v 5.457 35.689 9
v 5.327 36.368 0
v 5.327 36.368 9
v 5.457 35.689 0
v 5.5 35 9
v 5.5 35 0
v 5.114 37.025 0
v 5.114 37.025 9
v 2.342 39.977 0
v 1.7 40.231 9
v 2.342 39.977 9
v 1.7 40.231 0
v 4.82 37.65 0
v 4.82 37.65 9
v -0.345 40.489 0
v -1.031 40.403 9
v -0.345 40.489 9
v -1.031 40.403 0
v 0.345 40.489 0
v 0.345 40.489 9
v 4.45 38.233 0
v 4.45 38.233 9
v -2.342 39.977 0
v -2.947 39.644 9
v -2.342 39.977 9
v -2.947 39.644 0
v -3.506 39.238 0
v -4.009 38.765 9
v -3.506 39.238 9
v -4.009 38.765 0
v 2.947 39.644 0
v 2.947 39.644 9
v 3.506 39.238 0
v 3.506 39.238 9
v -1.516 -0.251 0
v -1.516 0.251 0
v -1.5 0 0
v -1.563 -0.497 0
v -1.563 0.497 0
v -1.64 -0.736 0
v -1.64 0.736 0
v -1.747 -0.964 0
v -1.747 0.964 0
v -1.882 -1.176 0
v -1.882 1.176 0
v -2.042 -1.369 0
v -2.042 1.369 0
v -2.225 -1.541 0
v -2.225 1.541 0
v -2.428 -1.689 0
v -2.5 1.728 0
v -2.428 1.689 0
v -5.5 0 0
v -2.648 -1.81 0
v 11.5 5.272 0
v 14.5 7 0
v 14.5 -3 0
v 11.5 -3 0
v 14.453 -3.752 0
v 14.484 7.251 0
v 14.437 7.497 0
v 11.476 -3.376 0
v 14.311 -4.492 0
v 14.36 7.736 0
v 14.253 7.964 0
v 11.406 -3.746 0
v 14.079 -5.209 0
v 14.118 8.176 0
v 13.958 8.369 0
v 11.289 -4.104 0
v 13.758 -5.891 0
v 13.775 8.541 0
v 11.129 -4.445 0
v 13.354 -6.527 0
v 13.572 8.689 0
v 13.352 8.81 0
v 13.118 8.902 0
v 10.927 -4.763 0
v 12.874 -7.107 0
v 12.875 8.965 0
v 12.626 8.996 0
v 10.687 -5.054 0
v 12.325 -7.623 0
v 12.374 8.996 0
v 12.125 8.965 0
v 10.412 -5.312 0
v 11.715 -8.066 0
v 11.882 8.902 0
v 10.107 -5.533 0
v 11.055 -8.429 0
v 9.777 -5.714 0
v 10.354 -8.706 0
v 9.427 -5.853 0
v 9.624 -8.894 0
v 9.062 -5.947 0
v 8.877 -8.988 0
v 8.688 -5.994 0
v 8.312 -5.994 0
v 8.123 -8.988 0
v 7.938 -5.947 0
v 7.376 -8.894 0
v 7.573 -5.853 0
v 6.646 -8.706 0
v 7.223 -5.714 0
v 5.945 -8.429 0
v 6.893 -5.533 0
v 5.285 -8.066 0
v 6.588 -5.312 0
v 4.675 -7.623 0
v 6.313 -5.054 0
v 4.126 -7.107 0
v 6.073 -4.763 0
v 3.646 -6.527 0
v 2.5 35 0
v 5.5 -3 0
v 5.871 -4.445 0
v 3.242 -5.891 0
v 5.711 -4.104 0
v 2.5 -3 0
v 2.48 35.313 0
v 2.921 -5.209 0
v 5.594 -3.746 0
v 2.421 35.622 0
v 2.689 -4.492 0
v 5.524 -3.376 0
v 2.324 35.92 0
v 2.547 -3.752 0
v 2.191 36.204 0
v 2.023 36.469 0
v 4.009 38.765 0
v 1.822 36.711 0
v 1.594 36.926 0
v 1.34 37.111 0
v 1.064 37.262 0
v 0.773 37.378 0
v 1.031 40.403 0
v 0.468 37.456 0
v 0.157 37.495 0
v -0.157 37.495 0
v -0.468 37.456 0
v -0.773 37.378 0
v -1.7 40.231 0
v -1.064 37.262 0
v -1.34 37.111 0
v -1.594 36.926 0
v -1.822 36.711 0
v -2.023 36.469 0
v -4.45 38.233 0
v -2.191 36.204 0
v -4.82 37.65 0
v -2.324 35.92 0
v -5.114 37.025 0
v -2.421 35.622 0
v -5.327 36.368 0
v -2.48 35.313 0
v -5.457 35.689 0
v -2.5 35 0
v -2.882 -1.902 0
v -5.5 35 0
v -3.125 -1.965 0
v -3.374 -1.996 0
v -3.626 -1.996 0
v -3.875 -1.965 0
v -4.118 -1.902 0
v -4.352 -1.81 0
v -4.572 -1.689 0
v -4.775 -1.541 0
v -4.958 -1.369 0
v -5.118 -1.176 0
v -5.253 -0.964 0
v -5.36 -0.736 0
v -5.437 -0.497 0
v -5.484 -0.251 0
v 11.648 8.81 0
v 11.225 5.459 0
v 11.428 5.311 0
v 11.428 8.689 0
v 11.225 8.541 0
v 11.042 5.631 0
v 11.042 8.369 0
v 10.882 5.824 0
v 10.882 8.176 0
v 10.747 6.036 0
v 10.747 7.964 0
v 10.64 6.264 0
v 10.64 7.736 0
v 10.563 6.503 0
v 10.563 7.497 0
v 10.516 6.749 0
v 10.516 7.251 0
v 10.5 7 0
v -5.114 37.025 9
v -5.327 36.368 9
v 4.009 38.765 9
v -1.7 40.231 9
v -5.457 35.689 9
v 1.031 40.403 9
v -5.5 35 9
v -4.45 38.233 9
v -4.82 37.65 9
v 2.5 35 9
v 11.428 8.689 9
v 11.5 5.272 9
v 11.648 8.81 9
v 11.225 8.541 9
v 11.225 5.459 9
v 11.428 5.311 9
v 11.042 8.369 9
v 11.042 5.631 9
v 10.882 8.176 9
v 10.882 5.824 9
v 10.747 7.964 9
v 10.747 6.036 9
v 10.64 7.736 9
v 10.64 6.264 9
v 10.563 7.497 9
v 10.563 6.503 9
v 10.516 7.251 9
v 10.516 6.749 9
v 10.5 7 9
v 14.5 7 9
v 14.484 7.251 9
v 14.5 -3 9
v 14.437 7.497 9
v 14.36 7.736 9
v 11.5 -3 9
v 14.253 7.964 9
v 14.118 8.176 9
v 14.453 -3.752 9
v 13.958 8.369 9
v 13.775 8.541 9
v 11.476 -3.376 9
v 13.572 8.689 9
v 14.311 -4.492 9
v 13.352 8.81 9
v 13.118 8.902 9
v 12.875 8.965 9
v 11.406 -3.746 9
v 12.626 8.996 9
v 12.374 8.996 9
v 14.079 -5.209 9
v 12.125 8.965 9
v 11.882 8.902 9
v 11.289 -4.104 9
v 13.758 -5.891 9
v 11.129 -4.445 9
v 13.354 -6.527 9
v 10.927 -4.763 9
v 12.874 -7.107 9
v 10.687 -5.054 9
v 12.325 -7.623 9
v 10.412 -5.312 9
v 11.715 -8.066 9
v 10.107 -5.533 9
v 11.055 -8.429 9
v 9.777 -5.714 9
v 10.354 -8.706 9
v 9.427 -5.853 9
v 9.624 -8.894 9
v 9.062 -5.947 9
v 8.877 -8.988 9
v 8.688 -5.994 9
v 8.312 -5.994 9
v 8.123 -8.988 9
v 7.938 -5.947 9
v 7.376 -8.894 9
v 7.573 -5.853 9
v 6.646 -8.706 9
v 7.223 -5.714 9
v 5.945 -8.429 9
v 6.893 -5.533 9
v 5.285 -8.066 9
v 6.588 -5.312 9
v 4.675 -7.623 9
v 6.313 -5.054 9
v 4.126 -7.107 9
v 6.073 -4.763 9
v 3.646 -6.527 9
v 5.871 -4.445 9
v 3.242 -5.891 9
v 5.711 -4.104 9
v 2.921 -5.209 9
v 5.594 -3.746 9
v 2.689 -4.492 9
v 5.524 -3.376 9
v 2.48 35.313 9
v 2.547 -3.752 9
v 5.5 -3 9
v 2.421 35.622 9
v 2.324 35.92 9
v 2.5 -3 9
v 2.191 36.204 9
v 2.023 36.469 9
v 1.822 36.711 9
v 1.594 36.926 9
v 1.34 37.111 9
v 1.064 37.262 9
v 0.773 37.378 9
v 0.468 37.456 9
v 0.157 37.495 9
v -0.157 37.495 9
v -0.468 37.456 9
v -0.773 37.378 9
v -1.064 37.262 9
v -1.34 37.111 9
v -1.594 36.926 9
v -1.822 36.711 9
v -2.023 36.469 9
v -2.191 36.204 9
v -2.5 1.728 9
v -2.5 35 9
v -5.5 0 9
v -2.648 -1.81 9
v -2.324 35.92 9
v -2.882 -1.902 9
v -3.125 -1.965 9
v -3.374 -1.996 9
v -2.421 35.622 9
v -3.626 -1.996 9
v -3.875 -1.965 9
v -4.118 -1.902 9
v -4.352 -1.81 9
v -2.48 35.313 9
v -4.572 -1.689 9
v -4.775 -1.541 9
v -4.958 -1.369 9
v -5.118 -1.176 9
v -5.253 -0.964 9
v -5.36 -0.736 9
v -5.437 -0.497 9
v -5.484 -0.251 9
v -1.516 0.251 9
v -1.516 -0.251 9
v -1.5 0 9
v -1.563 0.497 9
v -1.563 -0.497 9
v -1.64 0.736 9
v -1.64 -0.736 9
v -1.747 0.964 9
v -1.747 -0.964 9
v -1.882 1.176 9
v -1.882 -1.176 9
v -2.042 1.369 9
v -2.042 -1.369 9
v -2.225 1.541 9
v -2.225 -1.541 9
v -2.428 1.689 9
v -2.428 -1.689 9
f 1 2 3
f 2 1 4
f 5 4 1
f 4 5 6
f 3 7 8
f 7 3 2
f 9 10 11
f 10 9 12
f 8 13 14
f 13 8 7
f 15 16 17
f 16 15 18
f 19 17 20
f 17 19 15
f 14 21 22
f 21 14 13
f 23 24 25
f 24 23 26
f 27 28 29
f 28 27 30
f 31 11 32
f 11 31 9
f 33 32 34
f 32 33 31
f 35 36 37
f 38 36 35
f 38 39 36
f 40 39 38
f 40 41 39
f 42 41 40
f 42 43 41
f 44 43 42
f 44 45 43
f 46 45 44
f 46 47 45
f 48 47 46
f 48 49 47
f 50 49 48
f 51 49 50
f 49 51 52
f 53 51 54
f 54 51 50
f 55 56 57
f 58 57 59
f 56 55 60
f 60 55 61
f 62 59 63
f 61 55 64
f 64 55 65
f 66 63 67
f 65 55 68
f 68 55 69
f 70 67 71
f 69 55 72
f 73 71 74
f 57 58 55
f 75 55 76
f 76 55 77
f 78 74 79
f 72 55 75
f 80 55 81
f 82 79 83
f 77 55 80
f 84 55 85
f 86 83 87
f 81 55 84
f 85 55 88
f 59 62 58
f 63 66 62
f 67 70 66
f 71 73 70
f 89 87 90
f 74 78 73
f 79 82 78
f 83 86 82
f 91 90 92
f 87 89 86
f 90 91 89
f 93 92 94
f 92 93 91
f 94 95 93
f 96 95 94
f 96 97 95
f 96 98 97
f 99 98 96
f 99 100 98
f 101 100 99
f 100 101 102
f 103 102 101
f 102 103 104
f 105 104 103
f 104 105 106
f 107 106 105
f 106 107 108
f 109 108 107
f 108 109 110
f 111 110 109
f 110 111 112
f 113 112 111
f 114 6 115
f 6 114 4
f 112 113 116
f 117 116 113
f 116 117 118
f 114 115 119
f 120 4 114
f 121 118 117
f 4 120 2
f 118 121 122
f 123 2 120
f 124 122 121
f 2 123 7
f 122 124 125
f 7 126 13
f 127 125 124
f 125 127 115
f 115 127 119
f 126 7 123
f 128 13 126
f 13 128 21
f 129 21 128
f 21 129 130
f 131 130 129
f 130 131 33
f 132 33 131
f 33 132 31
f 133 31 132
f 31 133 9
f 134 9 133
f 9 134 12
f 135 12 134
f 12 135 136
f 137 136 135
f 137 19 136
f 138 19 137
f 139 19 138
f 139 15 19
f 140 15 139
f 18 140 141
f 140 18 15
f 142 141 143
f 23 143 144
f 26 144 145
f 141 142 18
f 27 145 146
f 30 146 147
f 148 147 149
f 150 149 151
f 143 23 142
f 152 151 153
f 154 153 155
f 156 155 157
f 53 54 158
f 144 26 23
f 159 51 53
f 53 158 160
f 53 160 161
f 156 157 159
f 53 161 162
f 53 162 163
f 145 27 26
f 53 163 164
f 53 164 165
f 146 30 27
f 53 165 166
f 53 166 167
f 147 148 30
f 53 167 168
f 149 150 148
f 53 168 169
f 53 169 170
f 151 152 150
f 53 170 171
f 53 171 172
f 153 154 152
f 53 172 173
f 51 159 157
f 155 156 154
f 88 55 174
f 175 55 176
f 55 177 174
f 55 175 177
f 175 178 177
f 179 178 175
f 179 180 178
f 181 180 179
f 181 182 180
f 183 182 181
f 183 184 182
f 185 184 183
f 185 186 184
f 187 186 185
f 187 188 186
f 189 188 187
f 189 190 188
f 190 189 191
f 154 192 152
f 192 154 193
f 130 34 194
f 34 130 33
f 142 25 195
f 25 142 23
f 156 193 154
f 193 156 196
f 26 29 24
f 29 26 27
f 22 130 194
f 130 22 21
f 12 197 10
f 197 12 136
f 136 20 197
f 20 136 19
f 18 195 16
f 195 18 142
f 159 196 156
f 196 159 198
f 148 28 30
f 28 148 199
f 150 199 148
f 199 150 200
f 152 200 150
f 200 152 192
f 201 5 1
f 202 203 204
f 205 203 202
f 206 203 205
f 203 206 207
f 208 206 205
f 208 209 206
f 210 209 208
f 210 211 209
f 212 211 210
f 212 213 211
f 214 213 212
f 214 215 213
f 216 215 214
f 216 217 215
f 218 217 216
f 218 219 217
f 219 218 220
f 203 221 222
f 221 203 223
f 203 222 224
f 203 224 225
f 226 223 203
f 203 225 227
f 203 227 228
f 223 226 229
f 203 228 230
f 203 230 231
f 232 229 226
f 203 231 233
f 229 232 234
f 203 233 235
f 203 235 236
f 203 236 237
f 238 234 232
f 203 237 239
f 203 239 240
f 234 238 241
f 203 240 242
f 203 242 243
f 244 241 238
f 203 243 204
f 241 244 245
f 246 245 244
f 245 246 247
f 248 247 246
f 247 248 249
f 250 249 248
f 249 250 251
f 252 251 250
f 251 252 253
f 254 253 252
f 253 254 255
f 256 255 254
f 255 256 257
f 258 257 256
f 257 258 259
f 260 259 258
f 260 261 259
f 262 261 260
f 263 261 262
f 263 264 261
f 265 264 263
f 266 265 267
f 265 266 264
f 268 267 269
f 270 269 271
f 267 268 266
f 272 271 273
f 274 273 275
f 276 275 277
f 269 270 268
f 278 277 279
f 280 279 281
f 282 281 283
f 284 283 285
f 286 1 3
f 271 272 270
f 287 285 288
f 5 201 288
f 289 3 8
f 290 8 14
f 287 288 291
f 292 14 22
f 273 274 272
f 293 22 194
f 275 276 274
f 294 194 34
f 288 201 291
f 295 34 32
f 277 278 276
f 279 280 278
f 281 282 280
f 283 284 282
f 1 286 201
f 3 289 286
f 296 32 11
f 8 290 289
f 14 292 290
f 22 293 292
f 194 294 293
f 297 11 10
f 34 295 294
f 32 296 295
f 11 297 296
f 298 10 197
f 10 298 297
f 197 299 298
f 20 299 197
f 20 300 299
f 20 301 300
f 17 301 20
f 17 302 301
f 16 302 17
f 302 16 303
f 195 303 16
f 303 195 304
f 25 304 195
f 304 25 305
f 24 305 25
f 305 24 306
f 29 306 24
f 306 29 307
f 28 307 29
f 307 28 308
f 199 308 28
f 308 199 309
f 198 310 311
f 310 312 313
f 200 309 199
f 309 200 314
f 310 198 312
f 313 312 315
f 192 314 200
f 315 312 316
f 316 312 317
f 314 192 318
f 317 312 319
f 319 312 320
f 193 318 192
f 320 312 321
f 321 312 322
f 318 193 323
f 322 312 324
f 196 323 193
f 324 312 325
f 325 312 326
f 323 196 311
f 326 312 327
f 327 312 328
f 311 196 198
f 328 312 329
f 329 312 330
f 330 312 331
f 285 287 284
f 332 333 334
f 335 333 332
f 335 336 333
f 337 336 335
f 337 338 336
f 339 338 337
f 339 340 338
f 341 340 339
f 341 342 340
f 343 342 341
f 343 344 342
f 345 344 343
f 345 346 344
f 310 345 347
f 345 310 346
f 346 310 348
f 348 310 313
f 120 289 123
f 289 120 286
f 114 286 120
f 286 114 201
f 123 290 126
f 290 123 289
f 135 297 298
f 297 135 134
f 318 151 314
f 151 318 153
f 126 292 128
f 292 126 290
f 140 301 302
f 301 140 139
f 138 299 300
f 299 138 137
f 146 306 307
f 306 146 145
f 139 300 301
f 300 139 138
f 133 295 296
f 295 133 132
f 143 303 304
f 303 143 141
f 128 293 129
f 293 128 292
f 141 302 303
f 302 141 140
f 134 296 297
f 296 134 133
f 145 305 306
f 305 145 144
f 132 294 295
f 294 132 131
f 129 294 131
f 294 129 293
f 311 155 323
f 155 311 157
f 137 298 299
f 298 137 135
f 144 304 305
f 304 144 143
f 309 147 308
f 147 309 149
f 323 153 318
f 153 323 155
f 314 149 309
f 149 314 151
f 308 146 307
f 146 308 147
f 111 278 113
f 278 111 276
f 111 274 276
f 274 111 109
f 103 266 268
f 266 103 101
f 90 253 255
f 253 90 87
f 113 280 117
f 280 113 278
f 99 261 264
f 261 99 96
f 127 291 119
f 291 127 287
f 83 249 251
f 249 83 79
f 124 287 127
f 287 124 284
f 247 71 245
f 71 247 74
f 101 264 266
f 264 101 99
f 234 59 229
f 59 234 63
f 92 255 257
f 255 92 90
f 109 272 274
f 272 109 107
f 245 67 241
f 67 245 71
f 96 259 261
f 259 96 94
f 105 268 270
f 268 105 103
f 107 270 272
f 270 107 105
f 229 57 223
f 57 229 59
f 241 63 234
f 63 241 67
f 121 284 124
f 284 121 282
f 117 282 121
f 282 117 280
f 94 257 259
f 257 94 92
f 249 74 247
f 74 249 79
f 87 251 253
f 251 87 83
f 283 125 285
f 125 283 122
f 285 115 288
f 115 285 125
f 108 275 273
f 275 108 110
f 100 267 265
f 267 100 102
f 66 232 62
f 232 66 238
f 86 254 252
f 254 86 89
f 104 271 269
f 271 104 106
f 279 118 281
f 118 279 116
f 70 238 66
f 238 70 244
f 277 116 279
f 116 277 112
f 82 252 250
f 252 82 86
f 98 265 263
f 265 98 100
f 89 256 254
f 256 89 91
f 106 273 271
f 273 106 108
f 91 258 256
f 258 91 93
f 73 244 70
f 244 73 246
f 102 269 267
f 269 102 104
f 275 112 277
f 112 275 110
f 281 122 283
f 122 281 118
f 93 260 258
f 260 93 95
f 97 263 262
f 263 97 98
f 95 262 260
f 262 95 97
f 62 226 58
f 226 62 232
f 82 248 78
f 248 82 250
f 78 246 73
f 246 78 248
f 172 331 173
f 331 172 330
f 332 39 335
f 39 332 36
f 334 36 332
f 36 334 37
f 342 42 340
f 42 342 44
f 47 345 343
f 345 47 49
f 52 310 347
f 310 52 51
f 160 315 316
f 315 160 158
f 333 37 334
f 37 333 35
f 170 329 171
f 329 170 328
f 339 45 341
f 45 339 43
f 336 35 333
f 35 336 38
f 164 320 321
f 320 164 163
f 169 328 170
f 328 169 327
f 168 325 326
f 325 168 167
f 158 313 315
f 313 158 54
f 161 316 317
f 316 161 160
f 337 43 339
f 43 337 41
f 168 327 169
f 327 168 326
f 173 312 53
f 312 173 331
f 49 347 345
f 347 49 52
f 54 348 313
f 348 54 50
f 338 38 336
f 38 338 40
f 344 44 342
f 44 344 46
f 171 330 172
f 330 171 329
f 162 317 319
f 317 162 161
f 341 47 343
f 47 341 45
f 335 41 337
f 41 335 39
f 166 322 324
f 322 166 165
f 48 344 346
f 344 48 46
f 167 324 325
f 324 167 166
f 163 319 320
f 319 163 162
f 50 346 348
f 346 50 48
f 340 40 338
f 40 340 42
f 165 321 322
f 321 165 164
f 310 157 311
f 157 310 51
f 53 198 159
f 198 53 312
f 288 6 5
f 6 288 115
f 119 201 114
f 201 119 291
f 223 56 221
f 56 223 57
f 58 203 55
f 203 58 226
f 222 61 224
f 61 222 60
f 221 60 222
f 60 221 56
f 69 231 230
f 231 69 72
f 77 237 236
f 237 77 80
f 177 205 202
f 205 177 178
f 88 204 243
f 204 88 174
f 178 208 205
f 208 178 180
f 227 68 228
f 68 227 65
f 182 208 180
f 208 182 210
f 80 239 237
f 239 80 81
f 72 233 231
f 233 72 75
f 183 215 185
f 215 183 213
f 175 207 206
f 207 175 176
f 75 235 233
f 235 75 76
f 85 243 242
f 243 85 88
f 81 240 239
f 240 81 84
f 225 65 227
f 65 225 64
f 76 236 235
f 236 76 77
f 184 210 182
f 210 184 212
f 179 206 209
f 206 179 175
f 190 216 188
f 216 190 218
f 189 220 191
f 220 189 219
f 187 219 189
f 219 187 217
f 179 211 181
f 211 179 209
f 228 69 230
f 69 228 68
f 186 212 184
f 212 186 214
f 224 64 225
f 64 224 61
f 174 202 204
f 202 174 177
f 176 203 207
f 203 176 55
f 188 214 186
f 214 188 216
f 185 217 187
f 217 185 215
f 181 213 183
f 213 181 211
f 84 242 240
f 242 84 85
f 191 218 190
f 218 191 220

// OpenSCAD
$fn=50;

translate([-3.5,0,0]) cylinder(d=4,h=9);

translate([-5.5,0,0]) cube([3,35,9]);

translate([-0,35,0])
difference() {
  cylinder(d=11, h=9);
  translate([0,0,-0.1]) cylinder(d=5, h=9.2);
  translate([-6,-12,-0.1]) cube([12,12,12.2]);
}

translate([2.5,-3,0]) cube([3,38,9]);

translate([8.5,-3,0]) 
rotate([0,0,180])
difference() {
  cylinder(d=12, h=9);
  translate([0,0,-0.1]) cylinder(d=6, h=9.2);
  translate([-6,-12,-0.1]) cube([12,12,12.2]);
}

translate([11.5,-3,0]) cube([3,10,9]);

translate([12.5,7,0]) cylinder(d=4,h=9);
